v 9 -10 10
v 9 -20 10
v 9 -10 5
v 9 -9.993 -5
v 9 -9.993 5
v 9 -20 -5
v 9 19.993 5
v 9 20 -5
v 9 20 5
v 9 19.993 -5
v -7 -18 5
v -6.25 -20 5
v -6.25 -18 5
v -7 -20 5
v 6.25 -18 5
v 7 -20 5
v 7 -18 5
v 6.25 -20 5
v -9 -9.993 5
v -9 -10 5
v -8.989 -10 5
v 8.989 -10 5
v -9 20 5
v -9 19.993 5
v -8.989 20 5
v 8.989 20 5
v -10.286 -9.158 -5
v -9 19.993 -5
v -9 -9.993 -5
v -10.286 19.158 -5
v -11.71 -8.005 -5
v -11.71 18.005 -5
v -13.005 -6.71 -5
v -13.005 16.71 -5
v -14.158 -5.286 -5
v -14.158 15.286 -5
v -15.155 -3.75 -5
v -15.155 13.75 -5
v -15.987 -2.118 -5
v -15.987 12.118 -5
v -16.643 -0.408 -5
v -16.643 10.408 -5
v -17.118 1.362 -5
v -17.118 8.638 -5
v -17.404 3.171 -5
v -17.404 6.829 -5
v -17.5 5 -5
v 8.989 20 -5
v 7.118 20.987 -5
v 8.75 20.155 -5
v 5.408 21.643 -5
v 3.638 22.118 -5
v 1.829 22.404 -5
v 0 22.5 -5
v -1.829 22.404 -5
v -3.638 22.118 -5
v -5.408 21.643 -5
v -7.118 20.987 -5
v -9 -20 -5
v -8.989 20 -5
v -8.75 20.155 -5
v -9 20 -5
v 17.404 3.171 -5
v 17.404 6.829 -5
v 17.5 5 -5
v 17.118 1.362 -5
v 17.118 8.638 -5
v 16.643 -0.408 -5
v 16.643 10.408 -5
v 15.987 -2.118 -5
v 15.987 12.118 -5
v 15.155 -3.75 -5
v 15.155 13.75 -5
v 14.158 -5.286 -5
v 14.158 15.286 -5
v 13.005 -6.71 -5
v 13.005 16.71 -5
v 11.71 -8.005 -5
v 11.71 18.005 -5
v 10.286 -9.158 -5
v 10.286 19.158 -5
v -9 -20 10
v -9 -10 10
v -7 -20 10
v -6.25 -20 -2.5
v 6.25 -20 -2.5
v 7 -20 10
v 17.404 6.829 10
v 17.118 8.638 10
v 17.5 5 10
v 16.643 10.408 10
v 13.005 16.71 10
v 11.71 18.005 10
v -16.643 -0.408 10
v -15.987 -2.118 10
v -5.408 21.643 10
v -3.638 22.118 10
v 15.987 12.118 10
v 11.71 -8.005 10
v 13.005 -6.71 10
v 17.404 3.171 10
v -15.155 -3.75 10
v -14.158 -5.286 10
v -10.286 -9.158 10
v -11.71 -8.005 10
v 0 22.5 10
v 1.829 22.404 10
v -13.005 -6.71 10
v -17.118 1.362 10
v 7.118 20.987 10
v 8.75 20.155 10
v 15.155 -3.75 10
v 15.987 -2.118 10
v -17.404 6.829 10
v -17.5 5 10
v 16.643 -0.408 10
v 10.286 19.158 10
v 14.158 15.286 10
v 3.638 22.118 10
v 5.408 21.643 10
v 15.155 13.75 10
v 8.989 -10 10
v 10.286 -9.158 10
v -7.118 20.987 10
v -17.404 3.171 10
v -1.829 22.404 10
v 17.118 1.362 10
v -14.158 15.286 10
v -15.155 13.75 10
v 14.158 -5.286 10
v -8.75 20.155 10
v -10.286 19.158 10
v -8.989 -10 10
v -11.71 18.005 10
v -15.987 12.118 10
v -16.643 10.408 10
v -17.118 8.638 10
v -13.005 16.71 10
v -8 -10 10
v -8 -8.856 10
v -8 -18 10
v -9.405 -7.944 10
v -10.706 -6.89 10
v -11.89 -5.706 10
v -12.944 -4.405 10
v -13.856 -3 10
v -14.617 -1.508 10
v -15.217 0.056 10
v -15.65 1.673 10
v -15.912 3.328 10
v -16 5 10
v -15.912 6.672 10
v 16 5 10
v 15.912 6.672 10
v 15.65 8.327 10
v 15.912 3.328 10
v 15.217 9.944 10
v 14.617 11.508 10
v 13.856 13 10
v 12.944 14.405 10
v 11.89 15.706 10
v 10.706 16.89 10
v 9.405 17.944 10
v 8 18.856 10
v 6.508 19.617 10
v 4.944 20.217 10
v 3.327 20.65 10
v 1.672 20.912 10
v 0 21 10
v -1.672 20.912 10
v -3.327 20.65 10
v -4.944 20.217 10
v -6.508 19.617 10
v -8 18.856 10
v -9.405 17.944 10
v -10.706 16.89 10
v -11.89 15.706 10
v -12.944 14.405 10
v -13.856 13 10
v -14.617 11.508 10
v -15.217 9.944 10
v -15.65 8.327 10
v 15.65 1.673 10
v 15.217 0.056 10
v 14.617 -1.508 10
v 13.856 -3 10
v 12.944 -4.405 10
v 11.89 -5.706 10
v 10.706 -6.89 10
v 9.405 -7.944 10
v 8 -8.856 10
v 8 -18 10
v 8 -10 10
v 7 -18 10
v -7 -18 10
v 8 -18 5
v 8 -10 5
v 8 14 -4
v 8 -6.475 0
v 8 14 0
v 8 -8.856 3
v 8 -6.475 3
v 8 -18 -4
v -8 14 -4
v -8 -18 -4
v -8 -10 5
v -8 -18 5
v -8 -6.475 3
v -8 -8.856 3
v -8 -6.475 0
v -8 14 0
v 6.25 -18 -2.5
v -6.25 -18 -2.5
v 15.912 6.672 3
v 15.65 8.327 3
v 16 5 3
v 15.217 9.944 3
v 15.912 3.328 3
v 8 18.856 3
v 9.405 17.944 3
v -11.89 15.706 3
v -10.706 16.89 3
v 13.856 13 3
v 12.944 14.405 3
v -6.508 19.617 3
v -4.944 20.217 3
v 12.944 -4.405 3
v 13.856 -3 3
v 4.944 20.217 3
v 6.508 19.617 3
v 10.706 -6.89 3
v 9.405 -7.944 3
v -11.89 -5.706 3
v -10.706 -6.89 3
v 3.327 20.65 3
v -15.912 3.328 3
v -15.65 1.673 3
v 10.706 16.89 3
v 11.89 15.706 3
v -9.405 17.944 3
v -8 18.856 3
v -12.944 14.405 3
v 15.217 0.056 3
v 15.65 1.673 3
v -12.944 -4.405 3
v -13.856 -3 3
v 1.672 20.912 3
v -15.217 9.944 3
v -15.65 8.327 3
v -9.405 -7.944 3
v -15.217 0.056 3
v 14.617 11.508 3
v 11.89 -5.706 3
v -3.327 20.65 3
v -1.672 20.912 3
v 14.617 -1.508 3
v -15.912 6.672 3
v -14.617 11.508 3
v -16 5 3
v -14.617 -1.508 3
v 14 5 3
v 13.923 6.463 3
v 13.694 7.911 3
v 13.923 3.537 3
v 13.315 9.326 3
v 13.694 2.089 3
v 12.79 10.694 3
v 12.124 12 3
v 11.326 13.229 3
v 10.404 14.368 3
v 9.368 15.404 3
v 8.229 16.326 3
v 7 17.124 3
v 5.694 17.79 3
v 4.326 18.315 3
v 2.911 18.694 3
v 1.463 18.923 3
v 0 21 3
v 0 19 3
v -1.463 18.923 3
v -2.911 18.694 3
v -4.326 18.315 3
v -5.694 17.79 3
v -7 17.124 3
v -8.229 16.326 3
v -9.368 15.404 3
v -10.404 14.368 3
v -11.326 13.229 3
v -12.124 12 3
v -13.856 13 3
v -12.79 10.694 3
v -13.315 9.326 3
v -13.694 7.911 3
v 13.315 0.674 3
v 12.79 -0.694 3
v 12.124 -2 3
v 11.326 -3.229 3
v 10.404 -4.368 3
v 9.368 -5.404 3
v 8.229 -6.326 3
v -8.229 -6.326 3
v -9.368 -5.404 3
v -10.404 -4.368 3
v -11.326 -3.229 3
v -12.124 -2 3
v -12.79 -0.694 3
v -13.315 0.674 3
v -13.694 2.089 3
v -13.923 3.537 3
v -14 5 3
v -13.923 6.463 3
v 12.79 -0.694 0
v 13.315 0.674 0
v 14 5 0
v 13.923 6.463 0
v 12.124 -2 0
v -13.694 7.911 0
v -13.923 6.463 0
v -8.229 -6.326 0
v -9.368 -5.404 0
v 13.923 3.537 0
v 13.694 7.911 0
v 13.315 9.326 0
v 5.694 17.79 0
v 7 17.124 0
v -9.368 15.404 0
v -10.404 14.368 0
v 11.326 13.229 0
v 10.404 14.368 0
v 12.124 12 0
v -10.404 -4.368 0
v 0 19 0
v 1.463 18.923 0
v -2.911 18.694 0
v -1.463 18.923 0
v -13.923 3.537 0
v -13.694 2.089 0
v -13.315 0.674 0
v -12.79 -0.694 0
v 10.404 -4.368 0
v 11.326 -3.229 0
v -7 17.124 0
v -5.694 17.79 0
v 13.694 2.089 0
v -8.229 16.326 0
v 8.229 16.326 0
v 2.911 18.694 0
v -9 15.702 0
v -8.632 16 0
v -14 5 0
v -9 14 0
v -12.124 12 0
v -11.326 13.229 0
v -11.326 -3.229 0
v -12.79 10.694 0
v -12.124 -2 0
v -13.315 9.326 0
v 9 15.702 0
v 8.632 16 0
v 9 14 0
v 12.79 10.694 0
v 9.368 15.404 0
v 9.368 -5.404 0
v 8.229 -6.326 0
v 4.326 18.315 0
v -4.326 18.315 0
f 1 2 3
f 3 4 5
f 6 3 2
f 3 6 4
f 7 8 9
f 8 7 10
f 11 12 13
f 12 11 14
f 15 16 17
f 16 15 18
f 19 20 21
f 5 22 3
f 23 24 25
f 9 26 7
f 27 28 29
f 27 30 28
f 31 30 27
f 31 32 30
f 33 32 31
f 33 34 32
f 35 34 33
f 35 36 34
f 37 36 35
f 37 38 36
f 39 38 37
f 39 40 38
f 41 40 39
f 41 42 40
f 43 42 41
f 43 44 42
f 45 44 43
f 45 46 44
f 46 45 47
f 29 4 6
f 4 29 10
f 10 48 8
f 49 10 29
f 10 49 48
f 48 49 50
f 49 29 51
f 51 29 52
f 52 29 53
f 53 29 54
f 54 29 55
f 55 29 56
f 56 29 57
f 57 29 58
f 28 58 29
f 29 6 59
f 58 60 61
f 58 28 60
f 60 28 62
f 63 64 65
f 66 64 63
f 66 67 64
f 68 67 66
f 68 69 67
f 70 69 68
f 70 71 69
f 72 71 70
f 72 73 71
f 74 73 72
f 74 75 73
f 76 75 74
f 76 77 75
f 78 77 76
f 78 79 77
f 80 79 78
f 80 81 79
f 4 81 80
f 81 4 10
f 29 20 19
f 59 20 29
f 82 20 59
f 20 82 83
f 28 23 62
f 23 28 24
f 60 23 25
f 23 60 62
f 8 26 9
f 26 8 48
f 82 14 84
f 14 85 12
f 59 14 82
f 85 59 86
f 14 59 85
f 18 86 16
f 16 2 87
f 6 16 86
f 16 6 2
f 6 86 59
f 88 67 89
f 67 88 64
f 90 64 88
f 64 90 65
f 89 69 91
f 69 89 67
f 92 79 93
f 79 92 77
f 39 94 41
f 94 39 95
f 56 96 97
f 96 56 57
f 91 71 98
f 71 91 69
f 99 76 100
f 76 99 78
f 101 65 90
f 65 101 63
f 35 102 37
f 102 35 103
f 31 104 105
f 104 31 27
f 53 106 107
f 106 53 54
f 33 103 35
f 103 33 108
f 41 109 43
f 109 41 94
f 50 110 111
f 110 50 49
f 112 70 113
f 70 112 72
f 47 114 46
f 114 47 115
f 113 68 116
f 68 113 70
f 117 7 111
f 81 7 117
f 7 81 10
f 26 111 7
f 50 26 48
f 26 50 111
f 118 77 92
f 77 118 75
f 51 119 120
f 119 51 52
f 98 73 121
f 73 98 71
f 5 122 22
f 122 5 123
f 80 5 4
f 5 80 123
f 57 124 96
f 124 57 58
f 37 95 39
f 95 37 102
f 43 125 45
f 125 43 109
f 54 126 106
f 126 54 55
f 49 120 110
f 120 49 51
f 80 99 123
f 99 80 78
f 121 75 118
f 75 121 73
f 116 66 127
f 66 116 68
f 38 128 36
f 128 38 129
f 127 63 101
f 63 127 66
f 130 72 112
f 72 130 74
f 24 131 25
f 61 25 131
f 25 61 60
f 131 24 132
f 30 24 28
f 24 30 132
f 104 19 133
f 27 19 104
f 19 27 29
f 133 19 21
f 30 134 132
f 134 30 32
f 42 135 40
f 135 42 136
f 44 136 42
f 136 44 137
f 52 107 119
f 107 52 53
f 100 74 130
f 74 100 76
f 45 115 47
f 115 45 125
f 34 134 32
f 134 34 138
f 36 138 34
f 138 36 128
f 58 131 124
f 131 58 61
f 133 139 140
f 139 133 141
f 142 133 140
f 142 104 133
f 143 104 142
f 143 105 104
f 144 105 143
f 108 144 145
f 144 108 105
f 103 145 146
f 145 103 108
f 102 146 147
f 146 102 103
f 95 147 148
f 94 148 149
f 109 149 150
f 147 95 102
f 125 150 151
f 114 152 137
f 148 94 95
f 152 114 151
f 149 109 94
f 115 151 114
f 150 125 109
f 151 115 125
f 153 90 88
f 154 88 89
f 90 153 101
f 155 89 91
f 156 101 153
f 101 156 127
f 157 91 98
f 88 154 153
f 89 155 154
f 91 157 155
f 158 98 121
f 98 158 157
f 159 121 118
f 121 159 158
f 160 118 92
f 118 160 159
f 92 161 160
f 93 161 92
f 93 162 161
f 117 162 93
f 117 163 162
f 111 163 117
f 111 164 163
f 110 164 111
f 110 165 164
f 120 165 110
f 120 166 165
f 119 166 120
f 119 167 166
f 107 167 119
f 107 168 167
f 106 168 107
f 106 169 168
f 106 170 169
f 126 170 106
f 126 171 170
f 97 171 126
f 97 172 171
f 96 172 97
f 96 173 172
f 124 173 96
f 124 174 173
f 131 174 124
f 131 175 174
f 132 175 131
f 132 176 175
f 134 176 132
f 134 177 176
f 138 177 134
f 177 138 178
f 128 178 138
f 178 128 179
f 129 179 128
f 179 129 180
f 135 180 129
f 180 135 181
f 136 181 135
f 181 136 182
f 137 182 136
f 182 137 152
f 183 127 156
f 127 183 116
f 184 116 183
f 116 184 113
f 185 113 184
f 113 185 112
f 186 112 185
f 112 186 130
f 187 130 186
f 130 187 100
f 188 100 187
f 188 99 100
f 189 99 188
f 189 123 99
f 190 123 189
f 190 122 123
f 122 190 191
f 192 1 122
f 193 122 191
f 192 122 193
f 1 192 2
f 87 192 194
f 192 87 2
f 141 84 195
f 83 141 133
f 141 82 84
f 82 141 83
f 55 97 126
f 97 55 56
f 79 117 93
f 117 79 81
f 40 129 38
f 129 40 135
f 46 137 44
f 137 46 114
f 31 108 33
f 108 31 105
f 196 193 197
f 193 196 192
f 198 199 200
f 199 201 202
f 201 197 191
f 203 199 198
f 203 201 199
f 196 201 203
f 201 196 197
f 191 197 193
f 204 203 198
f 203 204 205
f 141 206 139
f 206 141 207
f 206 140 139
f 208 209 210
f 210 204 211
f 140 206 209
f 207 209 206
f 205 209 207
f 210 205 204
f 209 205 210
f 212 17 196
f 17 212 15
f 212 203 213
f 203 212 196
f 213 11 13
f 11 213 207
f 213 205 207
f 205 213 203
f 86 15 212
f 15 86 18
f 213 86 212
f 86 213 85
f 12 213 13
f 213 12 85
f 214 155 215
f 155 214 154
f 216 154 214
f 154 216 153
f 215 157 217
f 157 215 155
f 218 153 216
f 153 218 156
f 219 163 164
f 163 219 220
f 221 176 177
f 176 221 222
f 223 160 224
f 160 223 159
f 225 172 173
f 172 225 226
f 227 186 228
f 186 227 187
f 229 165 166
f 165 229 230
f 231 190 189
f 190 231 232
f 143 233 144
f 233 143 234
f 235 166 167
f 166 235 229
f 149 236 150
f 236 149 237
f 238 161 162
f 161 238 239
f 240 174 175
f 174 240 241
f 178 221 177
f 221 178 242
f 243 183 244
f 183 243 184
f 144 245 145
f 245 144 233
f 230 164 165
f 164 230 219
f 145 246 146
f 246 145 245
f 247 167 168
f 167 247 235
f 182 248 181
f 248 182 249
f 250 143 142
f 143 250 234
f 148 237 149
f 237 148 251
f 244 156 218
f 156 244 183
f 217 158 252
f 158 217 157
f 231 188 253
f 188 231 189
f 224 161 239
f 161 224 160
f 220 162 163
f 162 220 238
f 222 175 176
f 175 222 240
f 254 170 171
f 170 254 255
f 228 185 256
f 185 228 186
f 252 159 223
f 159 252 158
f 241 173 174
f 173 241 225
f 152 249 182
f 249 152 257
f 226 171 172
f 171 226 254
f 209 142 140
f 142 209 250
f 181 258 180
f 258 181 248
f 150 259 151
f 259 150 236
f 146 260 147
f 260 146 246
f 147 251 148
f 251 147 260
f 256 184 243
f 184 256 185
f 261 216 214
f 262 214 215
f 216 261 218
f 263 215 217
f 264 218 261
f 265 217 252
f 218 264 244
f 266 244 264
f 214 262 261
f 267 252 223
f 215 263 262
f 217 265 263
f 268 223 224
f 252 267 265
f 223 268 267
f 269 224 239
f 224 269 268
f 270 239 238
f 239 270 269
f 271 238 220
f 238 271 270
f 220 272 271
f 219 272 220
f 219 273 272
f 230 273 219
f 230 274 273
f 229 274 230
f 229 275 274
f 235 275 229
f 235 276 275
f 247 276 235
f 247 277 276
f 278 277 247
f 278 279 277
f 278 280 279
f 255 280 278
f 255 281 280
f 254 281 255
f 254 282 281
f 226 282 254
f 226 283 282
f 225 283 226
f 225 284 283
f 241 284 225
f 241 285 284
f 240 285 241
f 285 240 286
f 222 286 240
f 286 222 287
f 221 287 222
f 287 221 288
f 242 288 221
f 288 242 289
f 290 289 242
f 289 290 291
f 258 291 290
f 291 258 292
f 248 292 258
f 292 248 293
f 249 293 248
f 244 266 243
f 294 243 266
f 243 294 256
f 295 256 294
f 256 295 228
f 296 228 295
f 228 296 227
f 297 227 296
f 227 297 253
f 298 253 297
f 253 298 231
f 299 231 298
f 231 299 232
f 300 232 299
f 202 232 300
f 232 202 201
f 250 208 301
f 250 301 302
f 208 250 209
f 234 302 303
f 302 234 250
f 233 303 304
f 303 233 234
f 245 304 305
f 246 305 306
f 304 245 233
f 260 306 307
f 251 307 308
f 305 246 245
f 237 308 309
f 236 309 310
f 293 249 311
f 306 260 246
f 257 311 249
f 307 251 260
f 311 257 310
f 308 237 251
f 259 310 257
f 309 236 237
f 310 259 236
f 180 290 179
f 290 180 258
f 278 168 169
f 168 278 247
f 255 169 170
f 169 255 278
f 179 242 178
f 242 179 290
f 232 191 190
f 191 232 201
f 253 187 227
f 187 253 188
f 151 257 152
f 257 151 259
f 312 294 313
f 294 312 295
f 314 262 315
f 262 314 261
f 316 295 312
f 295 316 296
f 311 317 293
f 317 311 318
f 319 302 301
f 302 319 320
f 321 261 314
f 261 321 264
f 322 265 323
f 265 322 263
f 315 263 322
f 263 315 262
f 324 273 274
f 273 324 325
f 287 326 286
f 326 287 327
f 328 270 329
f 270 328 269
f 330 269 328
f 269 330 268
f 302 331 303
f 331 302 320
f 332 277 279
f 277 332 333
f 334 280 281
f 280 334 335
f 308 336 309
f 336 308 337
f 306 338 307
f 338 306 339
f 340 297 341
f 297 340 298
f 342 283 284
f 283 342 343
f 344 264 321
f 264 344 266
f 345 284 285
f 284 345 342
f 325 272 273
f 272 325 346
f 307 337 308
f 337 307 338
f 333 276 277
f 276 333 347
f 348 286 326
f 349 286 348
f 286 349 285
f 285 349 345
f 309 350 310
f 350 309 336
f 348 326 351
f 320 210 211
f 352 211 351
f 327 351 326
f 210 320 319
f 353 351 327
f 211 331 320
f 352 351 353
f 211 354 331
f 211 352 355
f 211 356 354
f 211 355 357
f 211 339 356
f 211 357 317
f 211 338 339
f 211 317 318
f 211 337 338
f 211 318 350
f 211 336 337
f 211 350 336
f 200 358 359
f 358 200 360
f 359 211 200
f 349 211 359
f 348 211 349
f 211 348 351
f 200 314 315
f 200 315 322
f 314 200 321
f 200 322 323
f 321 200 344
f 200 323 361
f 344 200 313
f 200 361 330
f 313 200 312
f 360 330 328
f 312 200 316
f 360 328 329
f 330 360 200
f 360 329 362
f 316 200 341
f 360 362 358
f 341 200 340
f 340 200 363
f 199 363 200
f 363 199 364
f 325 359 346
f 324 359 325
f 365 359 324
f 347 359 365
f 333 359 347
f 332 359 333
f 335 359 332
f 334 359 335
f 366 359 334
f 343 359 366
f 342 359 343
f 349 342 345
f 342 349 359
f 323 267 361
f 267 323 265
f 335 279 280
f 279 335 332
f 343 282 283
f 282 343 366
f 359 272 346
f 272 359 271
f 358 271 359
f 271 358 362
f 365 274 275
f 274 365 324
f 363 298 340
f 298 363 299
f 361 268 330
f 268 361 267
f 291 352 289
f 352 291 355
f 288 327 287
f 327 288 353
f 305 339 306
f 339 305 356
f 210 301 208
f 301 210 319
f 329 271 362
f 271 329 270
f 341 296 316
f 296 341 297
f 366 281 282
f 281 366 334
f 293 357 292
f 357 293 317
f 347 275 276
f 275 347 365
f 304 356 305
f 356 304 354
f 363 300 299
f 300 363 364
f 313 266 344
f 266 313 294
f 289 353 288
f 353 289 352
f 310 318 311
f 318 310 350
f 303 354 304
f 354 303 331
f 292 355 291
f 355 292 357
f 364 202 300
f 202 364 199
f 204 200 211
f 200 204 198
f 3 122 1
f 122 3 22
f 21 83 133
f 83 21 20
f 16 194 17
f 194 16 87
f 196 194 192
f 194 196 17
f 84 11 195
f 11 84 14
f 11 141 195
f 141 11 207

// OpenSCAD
module  bottom_case() {
    difference() {
        union() {
            cube([18, 40, 10], center=true);
            translate([0, 5, 2.5])
                cylinder($fn=60, d=35, h=15, center=true);
        }
        translate([0, -1, 3.5]) cube([16, 34, 15], center=true);
        translate([0, -19, 0]) cube([12.5, 4, 5], center=true);
        translate([0, -19, 3]) cube([12.5, 4, 5], center=true);
        translate([0, 5, 8]) cylinder($fn=60, d=32, h=10, center=true);
        translate([0, 5, 5]) cylinder($fn=60, d=28, h=10, center=true);
    }
    translate([0, 15, -2]) cube([18, 2, 4], center=true);
    translate([8.5, -15, 7.5]) cube([1, 10, 5], center=true);
    translate([-8.5, -15, 7.5]) cube([1, 10, 5], center=true);
    translate([8.0, -19, 7.5]) cube([2, 2, 5], center=true);
    translate([-8.0, -19, 7.5]) cube([2, 2, 5], center=true);
}

module top_case() {
    difference() {
        union() {
            translate([0, -15.0, 0]) 
                cube([18, 10, 2], center=true);
            translate([0, -12.8, -0.5]) 
                cube([15.8, 10, 3], center=true);
            translate([0, -14, -2.5]) 
                cube([15.8, 8, 7], center=true);
            translate([0, -19, -2.5]) 
                cube([13.8, 2, 7], center=true);
            translate([0, -19, -3.0]) 
                cube([12.3, 2, 8], center=true);
            translate([0, 5, 0])
                cylinder($fn=60, d=35, h=2, center=true);
            translate([0, 5, -0.5])
                cylinder($fn=60, d=31.8, h=3, center=true);
        }
        translate([0, 5, 0]) {
            for (x = [-7.5: 5: 7.5]) {
                for (y = [-7.5: 5: 7.5]) {
                    translate([x, y, 0]) 
                        cylinder($fn=15, d=3, h=10, center=true);
                }
            }
        }
    }     
}

bottom_case();
// translate([0,0,20]) top_case();
